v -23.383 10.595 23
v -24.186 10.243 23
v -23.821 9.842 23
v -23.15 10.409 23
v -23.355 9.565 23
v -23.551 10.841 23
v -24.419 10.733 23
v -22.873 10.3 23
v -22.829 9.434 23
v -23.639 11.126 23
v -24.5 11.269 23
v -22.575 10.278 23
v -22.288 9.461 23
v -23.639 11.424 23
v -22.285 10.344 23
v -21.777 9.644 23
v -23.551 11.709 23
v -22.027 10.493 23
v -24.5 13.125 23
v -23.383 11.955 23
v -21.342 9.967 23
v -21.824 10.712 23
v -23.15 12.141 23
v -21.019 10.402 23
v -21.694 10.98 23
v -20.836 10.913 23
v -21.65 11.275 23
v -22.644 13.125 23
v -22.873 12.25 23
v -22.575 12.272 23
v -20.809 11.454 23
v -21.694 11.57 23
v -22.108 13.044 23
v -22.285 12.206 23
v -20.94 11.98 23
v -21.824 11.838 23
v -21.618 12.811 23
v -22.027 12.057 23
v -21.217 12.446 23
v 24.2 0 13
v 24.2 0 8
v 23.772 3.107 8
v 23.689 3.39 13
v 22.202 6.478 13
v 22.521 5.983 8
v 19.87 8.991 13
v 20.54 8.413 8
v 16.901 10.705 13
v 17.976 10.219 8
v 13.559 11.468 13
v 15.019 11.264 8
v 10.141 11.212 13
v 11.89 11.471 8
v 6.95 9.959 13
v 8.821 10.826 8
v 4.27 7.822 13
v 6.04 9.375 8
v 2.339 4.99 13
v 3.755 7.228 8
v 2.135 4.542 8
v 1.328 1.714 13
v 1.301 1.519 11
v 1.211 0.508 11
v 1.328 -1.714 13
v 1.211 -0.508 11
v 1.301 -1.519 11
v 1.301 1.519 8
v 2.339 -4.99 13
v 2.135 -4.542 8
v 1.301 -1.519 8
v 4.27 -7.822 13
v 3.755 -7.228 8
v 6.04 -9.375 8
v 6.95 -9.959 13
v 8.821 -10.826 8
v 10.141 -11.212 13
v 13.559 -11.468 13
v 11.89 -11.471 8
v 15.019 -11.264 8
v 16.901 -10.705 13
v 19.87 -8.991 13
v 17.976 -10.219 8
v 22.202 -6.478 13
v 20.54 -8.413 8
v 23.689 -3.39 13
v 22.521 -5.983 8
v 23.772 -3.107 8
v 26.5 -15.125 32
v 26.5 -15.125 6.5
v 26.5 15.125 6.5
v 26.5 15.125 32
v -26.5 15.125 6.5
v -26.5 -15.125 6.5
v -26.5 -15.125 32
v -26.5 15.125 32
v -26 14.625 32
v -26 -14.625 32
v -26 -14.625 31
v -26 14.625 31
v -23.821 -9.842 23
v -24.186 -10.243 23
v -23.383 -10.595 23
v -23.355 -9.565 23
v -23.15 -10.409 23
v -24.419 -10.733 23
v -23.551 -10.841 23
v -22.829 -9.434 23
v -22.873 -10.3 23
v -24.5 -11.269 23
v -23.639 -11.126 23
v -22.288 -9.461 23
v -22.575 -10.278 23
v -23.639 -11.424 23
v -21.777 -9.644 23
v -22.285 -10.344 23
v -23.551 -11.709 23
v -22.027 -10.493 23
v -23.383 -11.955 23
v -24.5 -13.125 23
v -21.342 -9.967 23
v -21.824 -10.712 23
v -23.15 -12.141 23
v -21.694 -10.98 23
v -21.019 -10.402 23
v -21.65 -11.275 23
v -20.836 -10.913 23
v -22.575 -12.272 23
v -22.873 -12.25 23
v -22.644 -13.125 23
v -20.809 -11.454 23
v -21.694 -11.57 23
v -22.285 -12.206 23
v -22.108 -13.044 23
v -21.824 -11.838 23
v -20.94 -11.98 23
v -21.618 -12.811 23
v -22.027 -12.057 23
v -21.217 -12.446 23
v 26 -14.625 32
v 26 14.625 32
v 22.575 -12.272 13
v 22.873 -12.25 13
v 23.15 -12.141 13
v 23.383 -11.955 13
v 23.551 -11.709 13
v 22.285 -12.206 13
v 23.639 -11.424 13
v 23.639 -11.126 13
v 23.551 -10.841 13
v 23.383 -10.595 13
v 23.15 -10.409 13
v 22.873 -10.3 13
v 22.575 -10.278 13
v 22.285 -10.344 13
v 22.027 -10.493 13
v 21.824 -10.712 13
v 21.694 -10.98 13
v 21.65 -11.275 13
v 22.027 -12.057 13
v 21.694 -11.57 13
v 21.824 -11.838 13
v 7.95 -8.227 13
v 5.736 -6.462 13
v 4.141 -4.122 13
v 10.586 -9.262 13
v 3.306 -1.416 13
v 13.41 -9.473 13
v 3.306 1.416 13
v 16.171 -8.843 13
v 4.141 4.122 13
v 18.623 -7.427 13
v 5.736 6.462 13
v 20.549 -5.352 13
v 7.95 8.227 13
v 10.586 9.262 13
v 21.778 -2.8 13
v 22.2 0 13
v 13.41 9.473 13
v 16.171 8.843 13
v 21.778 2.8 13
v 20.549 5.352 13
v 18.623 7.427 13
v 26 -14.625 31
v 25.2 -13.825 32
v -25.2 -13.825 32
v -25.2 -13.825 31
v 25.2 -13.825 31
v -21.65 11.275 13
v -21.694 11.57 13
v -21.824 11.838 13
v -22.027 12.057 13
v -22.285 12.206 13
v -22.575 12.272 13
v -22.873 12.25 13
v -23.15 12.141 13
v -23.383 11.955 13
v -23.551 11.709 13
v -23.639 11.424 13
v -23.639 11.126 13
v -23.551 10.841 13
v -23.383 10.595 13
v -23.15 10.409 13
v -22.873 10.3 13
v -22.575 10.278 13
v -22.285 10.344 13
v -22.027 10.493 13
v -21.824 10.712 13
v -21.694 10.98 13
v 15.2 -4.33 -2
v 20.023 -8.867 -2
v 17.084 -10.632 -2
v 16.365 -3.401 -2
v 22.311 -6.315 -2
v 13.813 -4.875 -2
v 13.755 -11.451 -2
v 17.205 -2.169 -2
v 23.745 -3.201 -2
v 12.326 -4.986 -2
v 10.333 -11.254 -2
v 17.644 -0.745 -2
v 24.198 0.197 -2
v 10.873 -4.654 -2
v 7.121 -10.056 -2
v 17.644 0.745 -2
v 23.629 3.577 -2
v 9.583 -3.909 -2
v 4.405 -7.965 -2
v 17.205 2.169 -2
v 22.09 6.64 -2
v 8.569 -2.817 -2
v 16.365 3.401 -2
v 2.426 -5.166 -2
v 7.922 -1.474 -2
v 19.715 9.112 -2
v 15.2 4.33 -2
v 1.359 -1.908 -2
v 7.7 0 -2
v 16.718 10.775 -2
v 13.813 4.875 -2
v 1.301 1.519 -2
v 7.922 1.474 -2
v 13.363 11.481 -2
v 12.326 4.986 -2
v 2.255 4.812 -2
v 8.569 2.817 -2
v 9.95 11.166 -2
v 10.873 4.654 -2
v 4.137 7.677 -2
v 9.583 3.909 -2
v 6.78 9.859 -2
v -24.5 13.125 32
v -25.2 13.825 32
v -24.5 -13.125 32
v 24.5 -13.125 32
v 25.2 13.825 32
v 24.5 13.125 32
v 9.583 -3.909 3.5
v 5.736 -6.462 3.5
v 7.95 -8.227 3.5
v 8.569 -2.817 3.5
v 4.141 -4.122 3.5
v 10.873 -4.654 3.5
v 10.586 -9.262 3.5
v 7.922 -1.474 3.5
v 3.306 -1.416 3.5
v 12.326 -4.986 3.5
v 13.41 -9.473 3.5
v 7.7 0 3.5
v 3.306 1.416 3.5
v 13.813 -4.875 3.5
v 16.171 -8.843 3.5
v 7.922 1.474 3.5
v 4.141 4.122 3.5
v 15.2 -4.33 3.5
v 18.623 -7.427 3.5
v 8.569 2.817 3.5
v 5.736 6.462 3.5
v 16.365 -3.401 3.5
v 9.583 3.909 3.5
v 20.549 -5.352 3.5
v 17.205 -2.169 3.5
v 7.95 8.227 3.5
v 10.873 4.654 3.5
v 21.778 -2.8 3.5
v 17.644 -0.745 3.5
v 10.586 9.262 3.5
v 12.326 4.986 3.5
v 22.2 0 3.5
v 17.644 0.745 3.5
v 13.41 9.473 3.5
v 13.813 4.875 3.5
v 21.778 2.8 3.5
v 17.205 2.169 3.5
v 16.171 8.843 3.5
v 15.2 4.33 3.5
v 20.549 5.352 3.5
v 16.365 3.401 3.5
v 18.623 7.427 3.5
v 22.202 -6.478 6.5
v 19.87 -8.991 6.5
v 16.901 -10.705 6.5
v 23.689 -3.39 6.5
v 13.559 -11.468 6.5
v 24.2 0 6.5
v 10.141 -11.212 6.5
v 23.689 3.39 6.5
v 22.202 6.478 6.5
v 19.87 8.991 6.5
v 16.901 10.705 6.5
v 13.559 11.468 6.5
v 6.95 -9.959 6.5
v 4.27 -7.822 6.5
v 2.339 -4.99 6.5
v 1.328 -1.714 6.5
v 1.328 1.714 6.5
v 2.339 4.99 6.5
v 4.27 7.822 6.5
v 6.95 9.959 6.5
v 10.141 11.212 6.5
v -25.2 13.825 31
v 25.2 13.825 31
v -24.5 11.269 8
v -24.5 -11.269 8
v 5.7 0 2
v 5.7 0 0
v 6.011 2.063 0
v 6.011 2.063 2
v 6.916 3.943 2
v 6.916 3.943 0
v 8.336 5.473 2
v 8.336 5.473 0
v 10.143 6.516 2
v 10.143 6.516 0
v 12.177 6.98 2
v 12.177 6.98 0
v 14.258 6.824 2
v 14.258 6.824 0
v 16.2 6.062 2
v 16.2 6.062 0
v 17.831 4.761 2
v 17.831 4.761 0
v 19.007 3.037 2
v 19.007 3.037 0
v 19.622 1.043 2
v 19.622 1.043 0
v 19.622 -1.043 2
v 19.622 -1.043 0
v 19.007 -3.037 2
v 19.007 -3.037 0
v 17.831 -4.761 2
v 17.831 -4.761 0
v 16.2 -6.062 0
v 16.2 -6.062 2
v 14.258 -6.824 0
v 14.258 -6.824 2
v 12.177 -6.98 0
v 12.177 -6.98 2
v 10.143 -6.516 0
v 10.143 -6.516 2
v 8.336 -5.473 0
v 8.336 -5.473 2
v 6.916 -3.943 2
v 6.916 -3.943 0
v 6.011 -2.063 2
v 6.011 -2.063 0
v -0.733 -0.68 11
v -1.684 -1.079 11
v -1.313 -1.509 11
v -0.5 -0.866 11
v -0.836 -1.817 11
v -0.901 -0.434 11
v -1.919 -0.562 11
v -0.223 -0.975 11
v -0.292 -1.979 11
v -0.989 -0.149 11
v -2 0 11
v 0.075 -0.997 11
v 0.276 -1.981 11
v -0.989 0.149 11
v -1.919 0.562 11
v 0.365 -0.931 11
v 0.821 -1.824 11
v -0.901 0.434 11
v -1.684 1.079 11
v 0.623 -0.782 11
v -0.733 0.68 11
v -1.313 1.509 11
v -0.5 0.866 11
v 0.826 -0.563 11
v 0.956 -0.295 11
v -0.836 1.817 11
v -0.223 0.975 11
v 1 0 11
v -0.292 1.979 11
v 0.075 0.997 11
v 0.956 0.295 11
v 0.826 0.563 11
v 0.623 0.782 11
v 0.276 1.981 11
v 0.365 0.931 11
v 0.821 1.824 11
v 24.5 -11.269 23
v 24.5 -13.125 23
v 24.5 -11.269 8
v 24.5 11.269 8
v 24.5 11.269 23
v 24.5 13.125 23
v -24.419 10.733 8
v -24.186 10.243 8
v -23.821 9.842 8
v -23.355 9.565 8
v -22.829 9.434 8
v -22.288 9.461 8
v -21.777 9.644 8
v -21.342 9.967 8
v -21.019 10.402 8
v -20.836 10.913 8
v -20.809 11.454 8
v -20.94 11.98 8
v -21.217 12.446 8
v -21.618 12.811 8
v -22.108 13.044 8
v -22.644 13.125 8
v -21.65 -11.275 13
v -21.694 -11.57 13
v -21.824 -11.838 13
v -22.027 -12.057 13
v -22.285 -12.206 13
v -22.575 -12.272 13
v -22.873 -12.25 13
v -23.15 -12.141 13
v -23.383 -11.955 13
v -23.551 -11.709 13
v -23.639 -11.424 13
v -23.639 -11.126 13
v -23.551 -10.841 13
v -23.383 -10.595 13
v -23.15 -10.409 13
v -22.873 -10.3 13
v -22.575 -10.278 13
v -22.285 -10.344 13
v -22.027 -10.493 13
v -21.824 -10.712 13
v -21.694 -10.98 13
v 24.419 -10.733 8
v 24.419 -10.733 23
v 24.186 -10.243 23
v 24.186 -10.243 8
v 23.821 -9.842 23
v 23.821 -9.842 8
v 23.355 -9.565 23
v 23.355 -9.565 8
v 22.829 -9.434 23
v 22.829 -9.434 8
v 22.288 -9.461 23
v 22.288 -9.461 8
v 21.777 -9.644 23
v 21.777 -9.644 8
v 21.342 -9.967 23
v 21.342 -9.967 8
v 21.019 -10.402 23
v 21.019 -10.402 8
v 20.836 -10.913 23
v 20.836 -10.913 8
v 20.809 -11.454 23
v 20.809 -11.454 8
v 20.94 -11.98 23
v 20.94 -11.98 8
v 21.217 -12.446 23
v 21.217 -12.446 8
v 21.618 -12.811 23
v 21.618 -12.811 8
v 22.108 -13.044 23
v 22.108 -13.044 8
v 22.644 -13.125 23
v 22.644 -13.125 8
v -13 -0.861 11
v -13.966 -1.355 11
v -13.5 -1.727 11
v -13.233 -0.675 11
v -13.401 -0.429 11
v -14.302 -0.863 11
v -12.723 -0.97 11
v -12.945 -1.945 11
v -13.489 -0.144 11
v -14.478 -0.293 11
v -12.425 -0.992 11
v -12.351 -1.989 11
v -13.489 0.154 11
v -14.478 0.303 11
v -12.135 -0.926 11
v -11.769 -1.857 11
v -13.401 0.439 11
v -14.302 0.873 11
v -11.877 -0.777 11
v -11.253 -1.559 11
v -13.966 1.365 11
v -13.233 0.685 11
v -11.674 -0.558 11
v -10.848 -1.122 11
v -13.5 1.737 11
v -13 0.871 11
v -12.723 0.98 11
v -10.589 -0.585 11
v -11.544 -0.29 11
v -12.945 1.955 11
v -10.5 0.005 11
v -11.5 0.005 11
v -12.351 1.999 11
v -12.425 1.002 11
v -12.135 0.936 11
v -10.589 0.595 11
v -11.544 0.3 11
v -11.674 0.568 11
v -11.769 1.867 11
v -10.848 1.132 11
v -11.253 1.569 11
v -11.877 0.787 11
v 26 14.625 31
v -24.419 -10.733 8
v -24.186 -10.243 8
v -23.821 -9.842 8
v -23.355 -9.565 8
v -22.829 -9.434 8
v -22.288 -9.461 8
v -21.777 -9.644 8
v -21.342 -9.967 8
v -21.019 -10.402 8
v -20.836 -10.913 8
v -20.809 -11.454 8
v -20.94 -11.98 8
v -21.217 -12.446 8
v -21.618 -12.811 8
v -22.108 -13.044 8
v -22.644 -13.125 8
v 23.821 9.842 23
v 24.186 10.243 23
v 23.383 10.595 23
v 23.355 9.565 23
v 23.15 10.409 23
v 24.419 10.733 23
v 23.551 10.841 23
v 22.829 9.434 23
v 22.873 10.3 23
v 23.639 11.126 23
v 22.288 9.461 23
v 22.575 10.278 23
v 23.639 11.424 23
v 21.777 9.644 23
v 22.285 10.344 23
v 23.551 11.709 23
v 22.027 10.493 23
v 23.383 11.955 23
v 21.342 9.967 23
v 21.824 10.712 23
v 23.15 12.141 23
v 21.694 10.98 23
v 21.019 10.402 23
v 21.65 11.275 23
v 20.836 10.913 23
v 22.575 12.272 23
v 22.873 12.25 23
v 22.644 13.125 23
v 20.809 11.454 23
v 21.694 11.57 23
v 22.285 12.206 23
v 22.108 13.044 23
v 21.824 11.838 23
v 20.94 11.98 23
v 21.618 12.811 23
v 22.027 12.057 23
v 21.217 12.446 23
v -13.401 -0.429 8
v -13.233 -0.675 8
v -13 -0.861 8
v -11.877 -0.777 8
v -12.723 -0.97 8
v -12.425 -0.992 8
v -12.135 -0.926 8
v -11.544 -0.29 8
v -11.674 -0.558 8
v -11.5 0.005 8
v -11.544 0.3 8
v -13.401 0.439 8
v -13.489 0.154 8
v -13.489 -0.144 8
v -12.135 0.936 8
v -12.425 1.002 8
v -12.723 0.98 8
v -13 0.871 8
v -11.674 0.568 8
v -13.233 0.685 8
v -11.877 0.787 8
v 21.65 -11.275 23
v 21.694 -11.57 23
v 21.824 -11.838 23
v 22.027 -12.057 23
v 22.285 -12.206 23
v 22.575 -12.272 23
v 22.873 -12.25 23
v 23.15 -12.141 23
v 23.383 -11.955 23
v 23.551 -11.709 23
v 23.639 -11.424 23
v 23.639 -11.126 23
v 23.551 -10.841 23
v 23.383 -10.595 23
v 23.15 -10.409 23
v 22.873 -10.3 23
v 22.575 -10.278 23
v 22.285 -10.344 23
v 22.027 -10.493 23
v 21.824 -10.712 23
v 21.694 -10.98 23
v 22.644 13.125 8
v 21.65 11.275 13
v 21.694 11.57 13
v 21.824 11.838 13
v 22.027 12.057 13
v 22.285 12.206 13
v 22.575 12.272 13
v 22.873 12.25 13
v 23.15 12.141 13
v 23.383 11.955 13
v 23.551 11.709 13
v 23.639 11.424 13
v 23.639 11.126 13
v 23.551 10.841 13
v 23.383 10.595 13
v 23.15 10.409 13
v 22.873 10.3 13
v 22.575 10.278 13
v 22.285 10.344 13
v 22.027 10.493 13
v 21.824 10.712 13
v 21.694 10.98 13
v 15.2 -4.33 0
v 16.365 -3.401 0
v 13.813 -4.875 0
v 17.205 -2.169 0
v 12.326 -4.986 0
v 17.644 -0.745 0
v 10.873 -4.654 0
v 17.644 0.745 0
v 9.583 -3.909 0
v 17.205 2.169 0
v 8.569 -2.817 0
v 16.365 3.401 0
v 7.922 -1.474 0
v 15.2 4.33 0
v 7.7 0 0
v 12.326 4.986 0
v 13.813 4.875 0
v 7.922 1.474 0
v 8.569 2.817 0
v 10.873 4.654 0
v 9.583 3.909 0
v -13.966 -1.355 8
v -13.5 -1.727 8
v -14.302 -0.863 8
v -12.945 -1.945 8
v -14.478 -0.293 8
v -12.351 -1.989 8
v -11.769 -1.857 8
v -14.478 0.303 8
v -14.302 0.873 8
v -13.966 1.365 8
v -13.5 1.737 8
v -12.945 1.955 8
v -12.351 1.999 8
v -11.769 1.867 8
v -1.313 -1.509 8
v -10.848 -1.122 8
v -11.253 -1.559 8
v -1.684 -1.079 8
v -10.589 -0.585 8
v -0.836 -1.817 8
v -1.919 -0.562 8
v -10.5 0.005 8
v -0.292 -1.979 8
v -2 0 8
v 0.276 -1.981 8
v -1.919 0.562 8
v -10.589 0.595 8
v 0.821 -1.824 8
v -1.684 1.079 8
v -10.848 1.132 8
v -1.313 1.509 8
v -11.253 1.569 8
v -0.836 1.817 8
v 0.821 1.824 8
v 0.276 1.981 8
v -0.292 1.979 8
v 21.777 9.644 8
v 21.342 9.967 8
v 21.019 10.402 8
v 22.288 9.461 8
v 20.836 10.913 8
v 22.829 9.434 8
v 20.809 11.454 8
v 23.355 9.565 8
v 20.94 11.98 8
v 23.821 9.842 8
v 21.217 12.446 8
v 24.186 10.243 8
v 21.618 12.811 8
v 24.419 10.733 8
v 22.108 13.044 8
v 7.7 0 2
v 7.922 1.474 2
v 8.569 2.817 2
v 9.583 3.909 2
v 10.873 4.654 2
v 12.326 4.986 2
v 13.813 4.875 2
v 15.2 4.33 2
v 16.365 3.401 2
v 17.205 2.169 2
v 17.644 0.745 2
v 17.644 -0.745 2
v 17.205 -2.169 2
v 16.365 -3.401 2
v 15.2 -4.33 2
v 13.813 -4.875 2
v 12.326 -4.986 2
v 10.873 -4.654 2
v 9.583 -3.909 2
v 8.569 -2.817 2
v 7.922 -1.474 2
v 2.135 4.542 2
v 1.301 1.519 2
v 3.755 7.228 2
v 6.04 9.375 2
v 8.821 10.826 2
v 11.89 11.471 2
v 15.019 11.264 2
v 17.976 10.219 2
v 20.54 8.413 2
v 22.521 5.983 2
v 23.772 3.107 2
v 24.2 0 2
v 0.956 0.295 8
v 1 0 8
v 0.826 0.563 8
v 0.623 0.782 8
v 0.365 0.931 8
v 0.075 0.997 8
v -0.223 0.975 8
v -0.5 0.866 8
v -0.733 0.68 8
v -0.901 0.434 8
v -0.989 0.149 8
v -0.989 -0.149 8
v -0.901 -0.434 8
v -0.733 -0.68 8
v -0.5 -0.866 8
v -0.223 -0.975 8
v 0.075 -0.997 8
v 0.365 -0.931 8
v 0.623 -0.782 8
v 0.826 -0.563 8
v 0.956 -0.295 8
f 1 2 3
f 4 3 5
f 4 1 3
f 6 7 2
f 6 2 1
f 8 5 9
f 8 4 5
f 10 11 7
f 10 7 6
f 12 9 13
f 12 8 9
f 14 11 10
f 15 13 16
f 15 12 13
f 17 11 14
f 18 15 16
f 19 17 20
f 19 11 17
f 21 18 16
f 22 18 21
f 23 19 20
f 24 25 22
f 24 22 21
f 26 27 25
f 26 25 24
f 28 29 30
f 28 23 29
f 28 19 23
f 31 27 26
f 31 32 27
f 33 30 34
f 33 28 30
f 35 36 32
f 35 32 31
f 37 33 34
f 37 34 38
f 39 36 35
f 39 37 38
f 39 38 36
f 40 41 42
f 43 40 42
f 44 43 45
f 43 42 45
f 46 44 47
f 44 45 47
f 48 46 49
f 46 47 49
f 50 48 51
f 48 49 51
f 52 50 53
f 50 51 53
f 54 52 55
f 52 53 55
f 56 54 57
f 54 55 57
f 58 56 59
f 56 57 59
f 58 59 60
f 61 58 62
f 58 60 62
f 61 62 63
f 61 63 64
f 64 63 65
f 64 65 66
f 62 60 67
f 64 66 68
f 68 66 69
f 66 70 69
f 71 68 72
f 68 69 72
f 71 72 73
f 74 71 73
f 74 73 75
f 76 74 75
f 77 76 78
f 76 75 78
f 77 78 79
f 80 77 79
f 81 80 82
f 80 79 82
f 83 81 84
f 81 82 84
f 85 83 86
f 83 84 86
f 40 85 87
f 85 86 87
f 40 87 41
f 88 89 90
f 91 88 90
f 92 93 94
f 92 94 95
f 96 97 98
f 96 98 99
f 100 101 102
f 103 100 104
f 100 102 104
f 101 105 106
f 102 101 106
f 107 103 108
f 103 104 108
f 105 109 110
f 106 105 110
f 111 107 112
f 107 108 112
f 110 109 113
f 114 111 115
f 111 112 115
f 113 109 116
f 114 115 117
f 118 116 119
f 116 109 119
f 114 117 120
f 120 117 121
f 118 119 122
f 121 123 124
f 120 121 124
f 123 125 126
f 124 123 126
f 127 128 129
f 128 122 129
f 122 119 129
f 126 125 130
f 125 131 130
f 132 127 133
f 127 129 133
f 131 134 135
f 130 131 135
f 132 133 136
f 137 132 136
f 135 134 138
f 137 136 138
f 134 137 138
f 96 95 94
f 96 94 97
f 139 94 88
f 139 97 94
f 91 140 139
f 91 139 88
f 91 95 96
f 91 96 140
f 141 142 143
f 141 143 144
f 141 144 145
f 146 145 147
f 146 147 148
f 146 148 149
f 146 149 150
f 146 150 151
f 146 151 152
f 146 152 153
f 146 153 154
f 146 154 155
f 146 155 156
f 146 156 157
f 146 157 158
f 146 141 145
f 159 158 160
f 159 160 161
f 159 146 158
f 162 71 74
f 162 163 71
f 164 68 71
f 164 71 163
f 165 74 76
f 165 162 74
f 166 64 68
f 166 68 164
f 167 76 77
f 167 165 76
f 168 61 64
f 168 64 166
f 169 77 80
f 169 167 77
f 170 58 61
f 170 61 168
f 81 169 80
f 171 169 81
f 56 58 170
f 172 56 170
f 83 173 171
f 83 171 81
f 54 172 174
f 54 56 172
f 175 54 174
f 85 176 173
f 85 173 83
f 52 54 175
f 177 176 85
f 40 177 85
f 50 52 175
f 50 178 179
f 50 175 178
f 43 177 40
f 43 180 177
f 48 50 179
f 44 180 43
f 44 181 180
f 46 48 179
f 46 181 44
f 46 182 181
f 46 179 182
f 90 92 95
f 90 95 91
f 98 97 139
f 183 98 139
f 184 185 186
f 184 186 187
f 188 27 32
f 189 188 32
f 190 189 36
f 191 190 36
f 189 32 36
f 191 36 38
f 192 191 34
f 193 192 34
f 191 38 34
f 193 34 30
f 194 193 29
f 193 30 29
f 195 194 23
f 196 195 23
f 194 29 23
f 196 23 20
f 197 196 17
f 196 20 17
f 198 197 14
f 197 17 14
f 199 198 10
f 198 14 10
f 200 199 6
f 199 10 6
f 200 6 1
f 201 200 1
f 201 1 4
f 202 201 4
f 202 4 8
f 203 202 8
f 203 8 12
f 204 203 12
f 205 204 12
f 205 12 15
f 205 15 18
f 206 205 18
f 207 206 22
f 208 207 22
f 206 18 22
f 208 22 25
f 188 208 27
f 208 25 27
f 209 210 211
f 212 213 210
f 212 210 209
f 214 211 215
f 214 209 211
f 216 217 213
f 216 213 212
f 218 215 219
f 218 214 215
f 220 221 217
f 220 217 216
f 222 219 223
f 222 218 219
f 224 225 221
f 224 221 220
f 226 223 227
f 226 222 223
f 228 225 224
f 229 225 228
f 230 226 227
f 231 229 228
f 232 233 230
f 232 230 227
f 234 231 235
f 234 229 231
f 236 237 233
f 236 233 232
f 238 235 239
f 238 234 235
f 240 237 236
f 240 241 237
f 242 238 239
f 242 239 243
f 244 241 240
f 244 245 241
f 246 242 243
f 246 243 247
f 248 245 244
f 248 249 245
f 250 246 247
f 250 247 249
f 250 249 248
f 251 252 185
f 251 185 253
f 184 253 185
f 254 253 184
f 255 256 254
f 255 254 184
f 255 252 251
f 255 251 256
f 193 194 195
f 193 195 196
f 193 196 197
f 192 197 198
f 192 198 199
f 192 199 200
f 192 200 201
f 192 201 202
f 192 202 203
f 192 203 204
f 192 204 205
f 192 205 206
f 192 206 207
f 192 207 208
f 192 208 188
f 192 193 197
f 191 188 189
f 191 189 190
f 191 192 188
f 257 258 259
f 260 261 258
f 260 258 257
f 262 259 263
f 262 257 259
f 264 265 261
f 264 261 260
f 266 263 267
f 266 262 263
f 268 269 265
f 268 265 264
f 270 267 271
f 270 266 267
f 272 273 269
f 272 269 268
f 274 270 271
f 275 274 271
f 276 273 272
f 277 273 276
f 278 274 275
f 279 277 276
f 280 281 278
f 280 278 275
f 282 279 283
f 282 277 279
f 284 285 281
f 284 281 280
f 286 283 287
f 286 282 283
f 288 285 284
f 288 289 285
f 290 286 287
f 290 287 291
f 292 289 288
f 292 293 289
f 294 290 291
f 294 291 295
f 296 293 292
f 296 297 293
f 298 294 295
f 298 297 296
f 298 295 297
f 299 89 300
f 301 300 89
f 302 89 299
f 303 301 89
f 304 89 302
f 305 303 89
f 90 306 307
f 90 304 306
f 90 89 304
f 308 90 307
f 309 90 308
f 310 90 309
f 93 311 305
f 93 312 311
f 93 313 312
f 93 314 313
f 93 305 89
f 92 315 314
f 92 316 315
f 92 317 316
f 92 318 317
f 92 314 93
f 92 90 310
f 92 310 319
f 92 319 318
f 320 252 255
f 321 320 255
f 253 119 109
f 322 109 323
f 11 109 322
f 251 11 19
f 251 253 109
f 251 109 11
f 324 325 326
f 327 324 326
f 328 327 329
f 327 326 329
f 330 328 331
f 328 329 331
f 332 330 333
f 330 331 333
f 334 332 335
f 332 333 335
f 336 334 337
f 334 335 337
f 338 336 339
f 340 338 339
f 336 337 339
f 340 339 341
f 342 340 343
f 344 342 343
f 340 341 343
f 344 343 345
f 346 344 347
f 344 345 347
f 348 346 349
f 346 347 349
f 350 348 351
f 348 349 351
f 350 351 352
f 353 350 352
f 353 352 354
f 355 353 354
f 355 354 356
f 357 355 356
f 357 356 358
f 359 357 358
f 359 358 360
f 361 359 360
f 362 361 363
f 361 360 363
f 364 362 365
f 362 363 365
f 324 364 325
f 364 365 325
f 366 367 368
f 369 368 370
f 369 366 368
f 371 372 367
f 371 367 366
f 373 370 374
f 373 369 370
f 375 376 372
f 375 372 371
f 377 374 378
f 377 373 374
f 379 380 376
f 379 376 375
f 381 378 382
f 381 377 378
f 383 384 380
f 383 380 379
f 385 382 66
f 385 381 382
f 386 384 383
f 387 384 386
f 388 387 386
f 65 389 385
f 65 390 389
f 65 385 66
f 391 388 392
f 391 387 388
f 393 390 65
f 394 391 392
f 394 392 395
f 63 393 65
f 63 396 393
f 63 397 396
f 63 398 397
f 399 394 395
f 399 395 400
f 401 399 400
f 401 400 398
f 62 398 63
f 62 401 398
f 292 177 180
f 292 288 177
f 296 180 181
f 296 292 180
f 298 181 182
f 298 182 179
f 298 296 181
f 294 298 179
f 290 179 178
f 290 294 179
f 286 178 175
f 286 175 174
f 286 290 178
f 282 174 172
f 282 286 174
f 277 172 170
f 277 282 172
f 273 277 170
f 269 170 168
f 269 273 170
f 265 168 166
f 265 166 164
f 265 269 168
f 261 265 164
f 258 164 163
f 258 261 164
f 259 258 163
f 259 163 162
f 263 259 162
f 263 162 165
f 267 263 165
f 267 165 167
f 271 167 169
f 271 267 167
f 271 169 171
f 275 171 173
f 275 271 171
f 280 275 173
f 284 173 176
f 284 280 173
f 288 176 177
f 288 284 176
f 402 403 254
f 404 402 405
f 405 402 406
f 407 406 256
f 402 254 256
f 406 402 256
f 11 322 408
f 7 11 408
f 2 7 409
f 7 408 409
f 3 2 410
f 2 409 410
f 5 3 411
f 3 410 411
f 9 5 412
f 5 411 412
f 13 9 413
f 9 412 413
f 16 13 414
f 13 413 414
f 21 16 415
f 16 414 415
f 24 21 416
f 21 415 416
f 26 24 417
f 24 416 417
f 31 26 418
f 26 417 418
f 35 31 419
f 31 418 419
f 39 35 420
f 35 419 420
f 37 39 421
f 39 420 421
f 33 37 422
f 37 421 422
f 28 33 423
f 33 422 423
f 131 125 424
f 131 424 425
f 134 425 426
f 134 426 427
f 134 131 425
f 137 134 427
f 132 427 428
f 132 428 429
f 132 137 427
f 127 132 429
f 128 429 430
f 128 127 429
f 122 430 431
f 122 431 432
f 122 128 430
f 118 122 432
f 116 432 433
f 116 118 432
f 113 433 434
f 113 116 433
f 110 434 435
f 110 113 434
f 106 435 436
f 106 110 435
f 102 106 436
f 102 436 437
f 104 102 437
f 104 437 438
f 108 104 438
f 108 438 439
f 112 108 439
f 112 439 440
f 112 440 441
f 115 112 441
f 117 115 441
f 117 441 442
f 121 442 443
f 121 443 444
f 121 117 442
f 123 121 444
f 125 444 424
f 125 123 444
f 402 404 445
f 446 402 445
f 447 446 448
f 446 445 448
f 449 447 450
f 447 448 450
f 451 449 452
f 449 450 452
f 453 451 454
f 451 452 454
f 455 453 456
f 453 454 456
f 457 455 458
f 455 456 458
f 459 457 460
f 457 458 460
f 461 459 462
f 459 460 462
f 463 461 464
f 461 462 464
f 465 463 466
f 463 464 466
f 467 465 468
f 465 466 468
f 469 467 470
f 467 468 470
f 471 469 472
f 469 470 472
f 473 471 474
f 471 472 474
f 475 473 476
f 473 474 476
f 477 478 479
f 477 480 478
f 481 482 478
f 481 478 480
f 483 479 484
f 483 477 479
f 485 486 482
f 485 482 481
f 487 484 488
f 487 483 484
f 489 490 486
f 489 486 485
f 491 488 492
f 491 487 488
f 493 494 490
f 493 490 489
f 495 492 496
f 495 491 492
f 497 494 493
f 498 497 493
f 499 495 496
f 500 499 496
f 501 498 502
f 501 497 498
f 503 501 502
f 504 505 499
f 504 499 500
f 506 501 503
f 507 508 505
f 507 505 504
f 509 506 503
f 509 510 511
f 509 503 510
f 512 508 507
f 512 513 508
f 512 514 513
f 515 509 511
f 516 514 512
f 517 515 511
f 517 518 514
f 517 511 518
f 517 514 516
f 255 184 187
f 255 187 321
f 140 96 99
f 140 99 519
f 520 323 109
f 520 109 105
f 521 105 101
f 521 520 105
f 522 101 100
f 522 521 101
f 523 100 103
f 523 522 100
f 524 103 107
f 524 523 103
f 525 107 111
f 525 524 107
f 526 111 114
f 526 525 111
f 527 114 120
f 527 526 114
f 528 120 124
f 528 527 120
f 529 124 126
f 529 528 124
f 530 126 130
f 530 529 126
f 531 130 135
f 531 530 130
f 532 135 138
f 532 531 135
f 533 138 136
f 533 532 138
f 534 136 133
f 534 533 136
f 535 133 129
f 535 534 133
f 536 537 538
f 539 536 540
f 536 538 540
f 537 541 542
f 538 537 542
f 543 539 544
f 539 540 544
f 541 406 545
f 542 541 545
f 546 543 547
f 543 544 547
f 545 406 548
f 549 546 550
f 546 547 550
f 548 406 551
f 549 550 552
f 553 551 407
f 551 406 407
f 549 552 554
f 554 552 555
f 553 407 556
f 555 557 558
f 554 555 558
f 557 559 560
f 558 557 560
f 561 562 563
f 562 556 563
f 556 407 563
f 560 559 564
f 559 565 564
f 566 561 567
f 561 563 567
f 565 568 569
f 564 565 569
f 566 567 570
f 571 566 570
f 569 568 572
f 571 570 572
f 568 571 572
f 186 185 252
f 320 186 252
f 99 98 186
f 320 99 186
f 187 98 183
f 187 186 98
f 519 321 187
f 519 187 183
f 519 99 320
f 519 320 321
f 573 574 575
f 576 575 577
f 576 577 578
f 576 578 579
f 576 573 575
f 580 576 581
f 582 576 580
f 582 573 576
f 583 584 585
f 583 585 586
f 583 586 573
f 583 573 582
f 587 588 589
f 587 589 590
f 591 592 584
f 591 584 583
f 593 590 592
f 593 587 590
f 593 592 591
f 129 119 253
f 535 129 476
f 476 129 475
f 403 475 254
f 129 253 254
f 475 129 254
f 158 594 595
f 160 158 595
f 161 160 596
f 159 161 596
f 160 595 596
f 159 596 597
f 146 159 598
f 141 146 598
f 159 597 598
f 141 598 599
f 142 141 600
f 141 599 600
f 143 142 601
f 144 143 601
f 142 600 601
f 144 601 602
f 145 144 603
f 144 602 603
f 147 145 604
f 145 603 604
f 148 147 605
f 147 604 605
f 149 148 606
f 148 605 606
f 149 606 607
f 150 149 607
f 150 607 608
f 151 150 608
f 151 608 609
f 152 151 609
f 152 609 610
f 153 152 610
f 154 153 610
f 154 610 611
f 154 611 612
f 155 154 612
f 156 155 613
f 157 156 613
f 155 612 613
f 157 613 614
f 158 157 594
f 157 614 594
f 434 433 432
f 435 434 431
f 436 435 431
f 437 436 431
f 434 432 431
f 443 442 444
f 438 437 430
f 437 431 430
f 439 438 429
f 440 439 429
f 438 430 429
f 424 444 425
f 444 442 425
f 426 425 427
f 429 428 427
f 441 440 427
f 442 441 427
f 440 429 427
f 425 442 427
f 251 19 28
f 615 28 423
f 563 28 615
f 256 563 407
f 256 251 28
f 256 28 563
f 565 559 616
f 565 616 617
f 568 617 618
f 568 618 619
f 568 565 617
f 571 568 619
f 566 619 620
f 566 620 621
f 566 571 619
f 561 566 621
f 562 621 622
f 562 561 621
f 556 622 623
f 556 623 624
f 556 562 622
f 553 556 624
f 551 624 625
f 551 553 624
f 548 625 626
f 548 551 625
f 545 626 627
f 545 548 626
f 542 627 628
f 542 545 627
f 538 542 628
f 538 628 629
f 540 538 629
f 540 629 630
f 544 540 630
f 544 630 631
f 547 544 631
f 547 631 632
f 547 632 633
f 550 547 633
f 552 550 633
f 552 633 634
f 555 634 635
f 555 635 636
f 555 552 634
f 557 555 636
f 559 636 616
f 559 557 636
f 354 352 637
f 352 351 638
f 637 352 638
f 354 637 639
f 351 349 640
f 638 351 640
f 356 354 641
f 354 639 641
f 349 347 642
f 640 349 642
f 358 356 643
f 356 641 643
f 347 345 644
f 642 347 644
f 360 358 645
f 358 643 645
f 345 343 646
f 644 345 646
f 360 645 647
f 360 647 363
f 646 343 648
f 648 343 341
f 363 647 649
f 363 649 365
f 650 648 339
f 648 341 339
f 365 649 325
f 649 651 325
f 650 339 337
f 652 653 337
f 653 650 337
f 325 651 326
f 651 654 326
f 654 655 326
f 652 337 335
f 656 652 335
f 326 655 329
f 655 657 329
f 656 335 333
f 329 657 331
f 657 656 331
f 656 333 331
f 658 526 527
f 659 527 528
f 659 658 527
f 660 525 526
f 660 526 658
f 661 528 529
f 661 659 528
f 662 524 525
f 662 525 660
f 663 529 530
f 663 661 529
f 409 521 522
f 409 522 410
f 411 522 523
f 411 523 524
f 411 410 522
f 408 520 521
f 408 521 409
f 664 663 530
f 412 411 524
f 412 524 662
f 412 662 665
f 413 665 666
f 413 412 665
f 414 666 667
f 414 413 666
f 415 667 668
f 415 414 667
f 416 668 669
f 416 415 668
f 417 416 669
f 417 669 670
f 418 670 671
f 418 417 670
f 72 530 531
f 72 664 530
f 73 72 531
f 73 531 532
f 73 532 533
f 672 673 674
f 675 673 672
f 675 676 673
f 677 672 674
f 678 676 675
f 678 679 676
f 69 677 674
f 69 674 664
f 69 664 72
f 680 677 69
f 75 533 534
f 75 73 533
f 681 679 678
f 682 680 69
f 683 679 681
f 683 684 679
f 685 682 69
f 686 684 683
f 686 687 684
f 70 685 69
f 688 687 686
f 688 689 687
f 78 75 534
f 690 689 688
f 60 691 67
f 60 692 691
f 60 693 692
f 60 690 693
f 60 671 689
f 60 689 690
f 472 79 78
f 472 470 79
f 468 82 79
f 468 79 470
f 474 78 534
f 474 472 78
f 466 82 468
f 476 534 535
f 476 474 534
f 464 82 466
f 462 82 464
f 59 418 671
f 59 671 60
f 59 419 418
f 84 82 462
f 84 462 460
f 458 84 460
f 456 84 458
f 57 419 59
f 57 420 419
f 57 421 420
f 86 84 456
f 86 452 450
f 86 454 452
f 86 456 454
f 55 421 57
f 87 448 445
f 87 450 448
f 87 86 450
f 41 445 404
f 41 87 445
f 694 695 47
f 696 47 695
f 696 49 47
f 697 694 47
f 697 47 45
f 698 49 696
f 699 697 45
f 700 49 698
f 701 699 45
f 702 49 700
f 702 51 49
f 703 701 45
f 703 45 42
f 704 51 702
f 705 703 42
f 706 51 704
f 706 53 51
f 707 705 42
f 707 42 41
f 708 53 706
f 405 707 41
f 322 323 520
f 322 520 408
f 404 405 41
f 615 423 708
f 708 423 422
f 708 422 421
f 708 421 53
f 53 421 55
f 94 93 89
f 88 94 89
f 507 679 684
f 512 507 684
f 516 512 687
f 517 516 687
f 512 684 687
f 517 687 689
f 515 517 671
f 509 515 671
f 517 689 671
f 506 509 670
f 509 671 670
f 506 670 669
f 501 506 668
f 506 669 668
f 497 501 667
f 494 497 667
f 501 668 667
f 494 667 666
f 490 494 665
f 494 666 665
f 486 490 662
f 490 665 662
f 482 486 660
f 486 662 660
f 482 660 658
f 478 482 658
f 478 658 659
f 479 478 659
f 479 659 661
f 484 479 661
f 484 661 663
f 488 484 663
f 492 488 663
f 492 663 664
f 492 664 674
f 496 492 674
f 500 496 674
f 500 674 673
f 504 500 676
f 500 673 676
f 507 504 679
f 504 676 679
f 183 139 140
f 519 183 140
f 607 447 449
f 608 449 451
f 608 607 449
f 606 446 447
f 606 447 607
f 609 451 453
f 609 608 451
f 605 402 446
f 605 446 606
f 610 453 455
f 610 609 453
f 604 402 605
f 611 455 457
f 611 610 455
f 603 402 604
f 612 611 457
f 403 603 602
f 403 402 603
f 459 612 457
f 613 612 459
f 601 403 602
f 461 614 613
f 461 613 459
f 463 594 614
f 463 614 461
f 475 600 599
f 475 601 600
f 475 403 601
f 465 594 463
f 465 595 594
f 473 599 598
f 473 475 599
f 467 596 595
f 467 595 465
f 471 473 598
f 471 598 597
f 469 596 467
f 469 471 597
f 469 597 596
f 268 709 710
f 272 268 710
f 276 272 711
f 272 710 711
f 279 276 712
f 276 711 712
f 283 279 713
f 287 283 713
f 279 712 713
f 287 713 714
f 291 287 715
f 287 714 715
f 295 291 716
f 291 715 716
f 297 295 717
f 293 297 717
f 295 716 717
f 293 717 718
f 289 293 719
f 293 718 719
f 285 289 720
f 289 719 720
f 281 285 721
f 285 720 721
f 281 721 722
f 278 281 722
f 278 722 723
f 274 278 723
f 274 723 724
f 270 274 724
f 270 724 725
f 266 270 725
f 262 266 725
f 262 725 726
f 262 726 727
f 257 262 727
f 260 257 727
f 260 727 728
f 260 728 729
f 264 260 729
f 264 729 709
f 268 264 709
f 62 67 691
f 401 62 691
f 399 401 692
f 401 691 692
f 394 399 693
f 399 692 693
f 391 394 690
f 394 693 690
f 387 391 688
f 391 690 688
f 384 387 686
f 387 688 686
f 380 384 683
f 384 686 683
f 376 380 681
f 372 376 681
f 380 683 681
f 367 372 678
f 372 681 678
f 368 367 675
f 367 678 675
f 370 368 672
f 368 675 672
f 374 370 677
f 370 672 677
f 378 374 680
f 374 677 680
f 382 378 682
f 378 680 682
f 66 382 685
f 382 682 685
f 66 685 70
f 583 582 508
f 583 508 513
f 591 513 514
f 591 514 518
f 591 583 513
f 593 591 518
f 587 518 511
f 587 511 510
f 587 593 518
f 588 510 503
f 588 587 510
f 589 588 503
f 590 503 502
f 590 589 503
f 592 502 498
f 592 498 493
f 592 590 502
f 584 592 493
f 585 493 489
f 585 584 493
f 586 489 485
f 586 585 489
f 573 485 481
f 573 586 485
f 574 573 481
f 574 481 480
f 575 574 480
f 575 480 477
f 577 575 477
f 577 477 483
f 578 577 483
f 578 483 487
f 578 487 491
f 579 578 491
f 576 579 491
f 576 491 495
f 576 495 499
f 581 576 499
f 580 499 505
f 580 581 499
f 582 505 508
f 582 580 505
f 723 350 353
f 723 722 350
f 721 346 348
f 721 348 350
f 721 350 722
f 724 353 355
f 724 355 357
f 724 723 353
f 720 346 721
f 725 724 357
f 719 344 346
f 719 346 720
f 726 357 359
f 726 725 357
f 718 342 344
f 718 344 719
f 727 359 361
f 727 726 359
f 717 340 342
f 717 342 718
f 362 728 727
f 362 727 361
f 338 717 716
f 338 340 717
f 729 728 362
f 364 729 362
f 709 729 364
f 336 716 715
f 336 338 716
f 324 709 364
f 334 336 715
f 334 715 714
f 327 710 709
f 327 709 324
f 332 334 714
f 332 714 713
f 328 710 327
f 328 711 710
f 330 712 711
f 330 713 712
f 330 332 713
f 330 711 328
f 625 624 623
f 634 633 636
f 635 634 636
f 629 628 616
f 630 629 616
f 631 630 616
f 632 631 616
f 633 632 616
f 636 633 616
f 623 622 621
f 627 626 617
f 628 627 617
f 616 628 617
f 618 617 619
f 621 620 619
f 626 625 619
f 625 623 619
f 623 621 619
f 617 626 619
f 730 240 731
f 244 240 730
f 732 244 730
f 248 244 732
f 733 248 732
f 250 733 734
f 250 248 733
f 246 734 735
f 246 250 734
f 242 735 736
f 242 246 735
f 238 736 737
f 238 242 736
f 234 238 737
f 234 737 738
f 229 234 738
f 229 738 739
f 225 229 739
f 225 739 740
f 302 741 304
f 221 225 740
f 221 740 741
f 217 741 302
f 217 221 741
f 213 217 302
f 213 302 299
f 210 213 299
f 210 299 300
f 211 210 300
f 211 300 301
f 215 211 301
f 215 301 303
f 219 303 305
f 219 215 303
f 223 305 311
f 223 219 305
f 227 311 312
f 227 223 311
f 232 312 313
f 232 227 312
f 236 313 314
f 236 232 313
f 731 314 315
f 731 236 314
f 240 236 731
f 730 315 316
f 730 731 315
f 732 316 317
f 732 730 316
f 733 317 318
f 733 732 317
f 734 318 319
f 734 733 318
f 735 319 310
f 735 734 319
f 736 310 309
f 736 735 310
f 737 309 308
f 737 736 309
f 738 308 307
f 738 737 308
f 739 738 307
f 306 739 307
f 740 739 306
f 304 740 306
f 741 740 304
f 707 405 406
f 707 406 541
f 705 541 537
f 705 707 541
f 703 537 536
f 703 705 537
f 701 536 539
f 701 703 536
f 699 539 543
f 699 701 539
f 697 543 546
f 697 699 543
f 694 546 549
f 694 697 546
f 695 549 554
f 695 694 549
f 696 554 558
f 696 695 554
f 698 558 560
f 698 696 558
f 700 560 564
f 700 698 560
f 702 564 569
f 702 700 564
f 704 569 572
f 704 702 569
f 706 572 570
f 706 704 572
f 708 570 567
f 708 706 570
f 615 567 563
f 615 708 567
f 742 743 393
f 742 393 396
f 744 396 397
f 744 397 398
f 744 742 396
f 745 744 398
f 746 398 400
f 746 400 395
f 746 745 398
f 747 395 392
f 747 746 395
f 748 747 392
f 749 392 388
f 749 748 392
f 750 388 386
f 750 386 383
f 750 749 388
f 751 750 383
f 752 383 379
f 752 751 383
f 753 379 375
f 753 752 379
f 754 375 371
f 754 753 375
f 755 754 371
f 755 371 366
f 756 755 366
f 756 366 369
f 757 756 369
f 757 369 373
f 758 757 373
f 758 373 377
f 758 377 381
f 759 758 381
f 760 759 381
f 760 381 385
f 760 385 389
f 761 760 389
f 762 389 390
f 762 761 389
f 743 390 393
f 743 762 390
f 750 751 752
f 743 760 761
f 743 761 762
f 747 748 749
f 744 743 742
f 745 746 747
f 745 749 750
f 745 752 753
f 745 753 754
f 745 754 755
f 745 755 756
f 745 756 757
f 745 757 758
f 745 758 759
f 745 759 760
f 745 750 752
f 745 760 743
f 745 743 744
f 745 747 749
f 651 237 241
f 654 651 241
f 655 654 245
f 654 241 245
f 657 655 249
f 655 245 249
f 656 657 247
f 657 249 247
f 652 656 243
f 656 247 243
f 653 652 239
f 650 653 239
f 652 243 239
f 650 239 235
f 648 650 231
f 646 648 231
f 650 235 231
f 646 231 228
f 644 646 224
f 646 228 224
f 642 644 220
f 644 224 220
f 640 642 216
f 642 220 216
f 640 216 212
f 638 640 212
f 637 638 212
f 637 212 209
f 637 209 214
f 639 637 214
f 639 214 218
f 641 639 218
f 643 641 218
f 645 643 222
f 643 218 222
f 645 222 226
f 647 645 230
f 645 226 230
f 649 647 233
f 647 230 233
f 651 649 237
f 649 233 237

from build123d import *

# Parameters (mm, degrees)
SKETCH_1_W               = 53
SKETCH_1_H               = 30.25
EXTRUDE_1_DEPTH          = 32
SKETCH_2_W               = 49
SKETCH_2_H               = 26.25
CUT_EXTRUDE_1_DEPTH      = 24
SKETCH_3_W               = 52
SKETCH_3_H               = 29.25
SKETCH_3_W_2             = 50.4
SKETCH_3_H_2             = 27.65
CUT_EXTRUDE_2_DEPTH      = 1
EXTRUDE_2_DEPTH          = 15
SKETCH_7_R               = 1
CUT_EXTRUDE_4_DEPTH      = 10
MIRROR_2_COPY_1_DEPTH    = 15
MIRROR_2_COPY_2_SKETCH_R = 1
MIRROR_2_COPY_2_DEPTH    = 10
SKETCH_8_W               = 53
SKETCH_8_H               = 30.25
CUT_EXTRUDE_5_DEPTH      = 2
SKETCH_11_R              = 5
CUT_EXTRUDE_6_DEPTH      = 43.790368367
SKETCH_12_R              = 11.5
SKETCH_12_R_2            = 9.5
EXTRUDE_4_DEPTH          = 5
CUT_EXTRUDE_START        = -4.5
SKETCH_13_R              = 9.5
CUT_EXTRUDE_7_DEPTH      = 4.5
SKETCH_14_W              = 53
SKETCH_14_H              = 30.25
SKETCH_14_R              = 11.5
CUT_EXTRUDE_8_DEPTH      = 4.5
SKETCH_15_R              = 2
SKETCH_15_R_2            = 1
EXTRUDE_5_DEPTH          = 3
SKETCH_16_R              = 2
SKETCH_16_R_2            = 1
EXTRUDE_6_DEPTH          = 3
EXTRUDE_START            = 2
SKETCH_18_R              = 11.5
SKETCH_18_R_2            = 7
EXTRUDE_8_DEPTH          = 2
SKETCH_19_R              = 11.5
SKETCH_19_R_2            = 5
EXTRUDE_9_DEPTH          = 2


with BuildPart() as part:
    # 草图1 → 凸台-拉伸1 (new body)
    with BuildSketch(Plane.XY):
        Rectangle(SKETCH_1_W, SKETCH_1_H)
    extrude(amount=EXTRUDE_1_DEPTH)

    # 草图2 → 切除-拉伸1 (cut)
    with BuildSketch(Plane.XY.offset(32)):
        Rectangle(SKETCH_2_W, SKETCH_2_H)
    extrude(amount=-CUT_EXTRUDE_1_DEPTH, mode=Mode.SUBTRACT)

    # 草图3 → 切除-拉伸2 (cut)
    with BuildSketch(Plane.XY.offset(32)):
        Rectangle(SKETCH_3_W, SKETCH_3_H)
        Rectangle(SKETCH_3_W_2, SKETCH_3_H_2, mode=Mode.SUBTRACT)
    extrude(amount=-CUT_EXTRUDE_2_DEPTH, mode=Mode.SUBTRACT)

    # 草图6 → 凸台-拉伸2 (add)
    with BuildSketch(Plane.XY.offset(8)):
        with BuildLine():
            Line((-22.656269654, 13.125), (-24.5, 13.125))
            Line((-24.5, 13.125), (-24.5, 11.268730346))
            ThreePointArc((-24.5, 11.268730346), (-21.33741914, 9.97128577), (-22.656269654, 13.125))
        make_face()
    extrude_2 = extrude(amount=EXTRUDE_2_DEPTH)

    # 草图7 → 切除-拉伸4 (cut)
    with BuildSketch(Plane.XY.offset(23)):
        with Locations((-22.65, 11.275)):
            Circle(SKETCH_7_R)
    cut_extrude_4 = extrude(amount=-CUT_EXTRUDE_4_DEPTH, mode=Mode.SUBTRACT)

    # 镜向1: 凸台-拉伸2, 切除-拉伸4 across plane
    add(extrude_2.mirror(Plane.ZX))
    add(cut_extrude_4.mirror(Plane.ZX), mode=Mode.SUBTRACT)

    # 镜向2: 凸台-拉伸2, 切除-拉伸4 across plane
    add(extrude_2.mirror(Plane(origin=(0, 0, 0), x_dir=(0, 0, 1), z_dir=(1, 0, 0))))
    add(cut_extrude_4.mirror(Plane(origin=(0, 0, 0), x_dir=(0, 0, 1), z_dir=(1, 0, 0))), mode=Mode.SUBTRACT)

    # 镜向2 copy 1 sketch → 镜向2 copy 1 (add)
    with BuildSketch(Plane(origin=(0, 0, 8), x_dir=(-1, 0, 0), z_dir=(0, 0, 1))):
        with BuildLine():
            Line((-22.656269654, 13.125), (-24.5, 13.125))
            Line((-24.5, 13.125), (-24.5, 11.268730346))
            ThreePointArc((-24.5, 11.268730346), (-21.33741914, 9.97128577), (-22.656269654, 13.125))
        make_face()
    extrude(amount=MIRROR_2_COPY_1_DEPTH)

    # 镜向2 copy 2 sketch → 镜向2 copy 2 (cut)
    with BuildSketch(Plane(origin=(0, 0, 23), x_dir=(-1, 0, 0), z_dir=(0, 0, 1))):
        with Locations((-22.65, 11.275)):
            Circle(MIRROR_2_COPY_2_SKETCH_R)
    extrude(amount=-MIRROR_2_COPY_2_DEPTH, mode=Mode.SUBTRACT)

    # 草图8 → 切除-拉伸5 (cut)
    with BuildSketch(Plane(origin=(0, 0, 0), x_dir=(-1, 0, 0), z_dir=(0, 0, -1))):
        Rectangle(SKETCH_8_W, SKETCH_8_H)
    extrude(amount=-CUT_EXTRUDE_5_DEPTH, mode=Mode.SUBTRACT)

    # 草图11 → 切除-拉伸6 (cut, through all)
    with BuildSketch(Plane(origin=(0, 0, 2), x_dir=(-1, 0, 0), z_dir=(0, 0, -1))):
        with Locations((-12.7, 0)):
            Circle(SKETCH_11_R)
    extrude(amount=-CUT_EXTRUDE_6_DEPTH, mode=Mode.SUBTRACT)

    # 草图12 → 凸台-拉伸4 (add)
    with BuildSketch(Plane.XY.offset(8)):
        with Locations((12.7, 0)):
            Circle(SKETCH_12_R)
        with Locations((12.7, 0)):
            Circle(SKETCH_12_R_2, mode=Mode.SUBTRACT)
    extrude(amount=EXTRUDE_4_DEPTH)

    # 草图13 → 切除-拉伸7 (cut)
    with BuildSketch(Plane.XY.offset(8).offset(CUT_EXTRUDE_START)):
        with Locations((12.7, 0)):
            Circle(SKETCH_13_R)
    extrude(amount=CUT_EXTRUDE_7_DEPTH, mode=Mode.SUBTRACT)

    # 草图14 → 切除-拉伸8 (cut)
    with BuildSketch(Plane(origin=(0, 0, 2), x_dir=(-1, 0, 0), z_dir=(0, 0, -1))):
        Rectangle(SKETCH_14_W, SKETCH_14_H)
        with Locations(Location((-12.7, 0, 0), (0, 0, 180))):
            Circle(SKETCH_14_R, mode=Mode.SUBTRACT)
    extrude(amount=-CUT_EXTRUDE_8_DEPTH, mode=Mode.SUBTRACT)

    # 草图15 → 凸台-拉伸5 (add)
    with BuildSketch(Plane.XY.offset(8)):
        with Locations((-12.5, 0.005)):
            Circle(SKETCH_15_R)
        with Locations((-12.5, 0.005)):
            Circle(SKETCH_15_R_2, mode=Mode.SUBTRACT)
    extrude(amount=EXTRUDE_5_DEPTH)

    # 草图16 → 凸台-拉伸6 (add)
    with BuildSketch(Plane.XY.offset(8)):
        Circle(SKETCH_16_R)
        Circle(SKETCH_16_R_2, mode=Mode.SUBTRACT)
    extrude(amount=EXTRUDE_6_DEPTH)

    # 草图18 → 凸台-拉伸8 (add)
    with BuildSketch(Plane(origin=(0, 0, 2), x_dir=(-1, 0, 0), z_dir=(0, 0, -1)).offset(EXTRUDE_START)):
        with Locations(Location((-12.7, 0, 0), (0, 0, 7.591184195))):
            Circle(SKETCH_18_R)
        with Locations((-12.7, 0)):
            Circle(SKETCH_18_R_2, mode=Mode.SUBTRACT)
    extrude(amount=-EXTRUDE_8_DEPTH)

    # 草图19 → 凸台-拉伸9 (add)
    with BuildSketch(Plane(origin=(0, 0, 0), x_dir=(-1, 0, 0), z_dir=(0, 0, -1)).offset(EXTRUDE_START)):
        with Locations(Location((-12.7, 0, 0), (0, 0, 7.591184195))):
            Circle(SKETCH_19_R)
        with Locations((-12.7, 0)):
            Circle(SKETCH_19_R_2, mode=Mode.SUBTRACT)
    extrude(amount=-EXTRUDE_9_DEPTH)


solid = part.part
